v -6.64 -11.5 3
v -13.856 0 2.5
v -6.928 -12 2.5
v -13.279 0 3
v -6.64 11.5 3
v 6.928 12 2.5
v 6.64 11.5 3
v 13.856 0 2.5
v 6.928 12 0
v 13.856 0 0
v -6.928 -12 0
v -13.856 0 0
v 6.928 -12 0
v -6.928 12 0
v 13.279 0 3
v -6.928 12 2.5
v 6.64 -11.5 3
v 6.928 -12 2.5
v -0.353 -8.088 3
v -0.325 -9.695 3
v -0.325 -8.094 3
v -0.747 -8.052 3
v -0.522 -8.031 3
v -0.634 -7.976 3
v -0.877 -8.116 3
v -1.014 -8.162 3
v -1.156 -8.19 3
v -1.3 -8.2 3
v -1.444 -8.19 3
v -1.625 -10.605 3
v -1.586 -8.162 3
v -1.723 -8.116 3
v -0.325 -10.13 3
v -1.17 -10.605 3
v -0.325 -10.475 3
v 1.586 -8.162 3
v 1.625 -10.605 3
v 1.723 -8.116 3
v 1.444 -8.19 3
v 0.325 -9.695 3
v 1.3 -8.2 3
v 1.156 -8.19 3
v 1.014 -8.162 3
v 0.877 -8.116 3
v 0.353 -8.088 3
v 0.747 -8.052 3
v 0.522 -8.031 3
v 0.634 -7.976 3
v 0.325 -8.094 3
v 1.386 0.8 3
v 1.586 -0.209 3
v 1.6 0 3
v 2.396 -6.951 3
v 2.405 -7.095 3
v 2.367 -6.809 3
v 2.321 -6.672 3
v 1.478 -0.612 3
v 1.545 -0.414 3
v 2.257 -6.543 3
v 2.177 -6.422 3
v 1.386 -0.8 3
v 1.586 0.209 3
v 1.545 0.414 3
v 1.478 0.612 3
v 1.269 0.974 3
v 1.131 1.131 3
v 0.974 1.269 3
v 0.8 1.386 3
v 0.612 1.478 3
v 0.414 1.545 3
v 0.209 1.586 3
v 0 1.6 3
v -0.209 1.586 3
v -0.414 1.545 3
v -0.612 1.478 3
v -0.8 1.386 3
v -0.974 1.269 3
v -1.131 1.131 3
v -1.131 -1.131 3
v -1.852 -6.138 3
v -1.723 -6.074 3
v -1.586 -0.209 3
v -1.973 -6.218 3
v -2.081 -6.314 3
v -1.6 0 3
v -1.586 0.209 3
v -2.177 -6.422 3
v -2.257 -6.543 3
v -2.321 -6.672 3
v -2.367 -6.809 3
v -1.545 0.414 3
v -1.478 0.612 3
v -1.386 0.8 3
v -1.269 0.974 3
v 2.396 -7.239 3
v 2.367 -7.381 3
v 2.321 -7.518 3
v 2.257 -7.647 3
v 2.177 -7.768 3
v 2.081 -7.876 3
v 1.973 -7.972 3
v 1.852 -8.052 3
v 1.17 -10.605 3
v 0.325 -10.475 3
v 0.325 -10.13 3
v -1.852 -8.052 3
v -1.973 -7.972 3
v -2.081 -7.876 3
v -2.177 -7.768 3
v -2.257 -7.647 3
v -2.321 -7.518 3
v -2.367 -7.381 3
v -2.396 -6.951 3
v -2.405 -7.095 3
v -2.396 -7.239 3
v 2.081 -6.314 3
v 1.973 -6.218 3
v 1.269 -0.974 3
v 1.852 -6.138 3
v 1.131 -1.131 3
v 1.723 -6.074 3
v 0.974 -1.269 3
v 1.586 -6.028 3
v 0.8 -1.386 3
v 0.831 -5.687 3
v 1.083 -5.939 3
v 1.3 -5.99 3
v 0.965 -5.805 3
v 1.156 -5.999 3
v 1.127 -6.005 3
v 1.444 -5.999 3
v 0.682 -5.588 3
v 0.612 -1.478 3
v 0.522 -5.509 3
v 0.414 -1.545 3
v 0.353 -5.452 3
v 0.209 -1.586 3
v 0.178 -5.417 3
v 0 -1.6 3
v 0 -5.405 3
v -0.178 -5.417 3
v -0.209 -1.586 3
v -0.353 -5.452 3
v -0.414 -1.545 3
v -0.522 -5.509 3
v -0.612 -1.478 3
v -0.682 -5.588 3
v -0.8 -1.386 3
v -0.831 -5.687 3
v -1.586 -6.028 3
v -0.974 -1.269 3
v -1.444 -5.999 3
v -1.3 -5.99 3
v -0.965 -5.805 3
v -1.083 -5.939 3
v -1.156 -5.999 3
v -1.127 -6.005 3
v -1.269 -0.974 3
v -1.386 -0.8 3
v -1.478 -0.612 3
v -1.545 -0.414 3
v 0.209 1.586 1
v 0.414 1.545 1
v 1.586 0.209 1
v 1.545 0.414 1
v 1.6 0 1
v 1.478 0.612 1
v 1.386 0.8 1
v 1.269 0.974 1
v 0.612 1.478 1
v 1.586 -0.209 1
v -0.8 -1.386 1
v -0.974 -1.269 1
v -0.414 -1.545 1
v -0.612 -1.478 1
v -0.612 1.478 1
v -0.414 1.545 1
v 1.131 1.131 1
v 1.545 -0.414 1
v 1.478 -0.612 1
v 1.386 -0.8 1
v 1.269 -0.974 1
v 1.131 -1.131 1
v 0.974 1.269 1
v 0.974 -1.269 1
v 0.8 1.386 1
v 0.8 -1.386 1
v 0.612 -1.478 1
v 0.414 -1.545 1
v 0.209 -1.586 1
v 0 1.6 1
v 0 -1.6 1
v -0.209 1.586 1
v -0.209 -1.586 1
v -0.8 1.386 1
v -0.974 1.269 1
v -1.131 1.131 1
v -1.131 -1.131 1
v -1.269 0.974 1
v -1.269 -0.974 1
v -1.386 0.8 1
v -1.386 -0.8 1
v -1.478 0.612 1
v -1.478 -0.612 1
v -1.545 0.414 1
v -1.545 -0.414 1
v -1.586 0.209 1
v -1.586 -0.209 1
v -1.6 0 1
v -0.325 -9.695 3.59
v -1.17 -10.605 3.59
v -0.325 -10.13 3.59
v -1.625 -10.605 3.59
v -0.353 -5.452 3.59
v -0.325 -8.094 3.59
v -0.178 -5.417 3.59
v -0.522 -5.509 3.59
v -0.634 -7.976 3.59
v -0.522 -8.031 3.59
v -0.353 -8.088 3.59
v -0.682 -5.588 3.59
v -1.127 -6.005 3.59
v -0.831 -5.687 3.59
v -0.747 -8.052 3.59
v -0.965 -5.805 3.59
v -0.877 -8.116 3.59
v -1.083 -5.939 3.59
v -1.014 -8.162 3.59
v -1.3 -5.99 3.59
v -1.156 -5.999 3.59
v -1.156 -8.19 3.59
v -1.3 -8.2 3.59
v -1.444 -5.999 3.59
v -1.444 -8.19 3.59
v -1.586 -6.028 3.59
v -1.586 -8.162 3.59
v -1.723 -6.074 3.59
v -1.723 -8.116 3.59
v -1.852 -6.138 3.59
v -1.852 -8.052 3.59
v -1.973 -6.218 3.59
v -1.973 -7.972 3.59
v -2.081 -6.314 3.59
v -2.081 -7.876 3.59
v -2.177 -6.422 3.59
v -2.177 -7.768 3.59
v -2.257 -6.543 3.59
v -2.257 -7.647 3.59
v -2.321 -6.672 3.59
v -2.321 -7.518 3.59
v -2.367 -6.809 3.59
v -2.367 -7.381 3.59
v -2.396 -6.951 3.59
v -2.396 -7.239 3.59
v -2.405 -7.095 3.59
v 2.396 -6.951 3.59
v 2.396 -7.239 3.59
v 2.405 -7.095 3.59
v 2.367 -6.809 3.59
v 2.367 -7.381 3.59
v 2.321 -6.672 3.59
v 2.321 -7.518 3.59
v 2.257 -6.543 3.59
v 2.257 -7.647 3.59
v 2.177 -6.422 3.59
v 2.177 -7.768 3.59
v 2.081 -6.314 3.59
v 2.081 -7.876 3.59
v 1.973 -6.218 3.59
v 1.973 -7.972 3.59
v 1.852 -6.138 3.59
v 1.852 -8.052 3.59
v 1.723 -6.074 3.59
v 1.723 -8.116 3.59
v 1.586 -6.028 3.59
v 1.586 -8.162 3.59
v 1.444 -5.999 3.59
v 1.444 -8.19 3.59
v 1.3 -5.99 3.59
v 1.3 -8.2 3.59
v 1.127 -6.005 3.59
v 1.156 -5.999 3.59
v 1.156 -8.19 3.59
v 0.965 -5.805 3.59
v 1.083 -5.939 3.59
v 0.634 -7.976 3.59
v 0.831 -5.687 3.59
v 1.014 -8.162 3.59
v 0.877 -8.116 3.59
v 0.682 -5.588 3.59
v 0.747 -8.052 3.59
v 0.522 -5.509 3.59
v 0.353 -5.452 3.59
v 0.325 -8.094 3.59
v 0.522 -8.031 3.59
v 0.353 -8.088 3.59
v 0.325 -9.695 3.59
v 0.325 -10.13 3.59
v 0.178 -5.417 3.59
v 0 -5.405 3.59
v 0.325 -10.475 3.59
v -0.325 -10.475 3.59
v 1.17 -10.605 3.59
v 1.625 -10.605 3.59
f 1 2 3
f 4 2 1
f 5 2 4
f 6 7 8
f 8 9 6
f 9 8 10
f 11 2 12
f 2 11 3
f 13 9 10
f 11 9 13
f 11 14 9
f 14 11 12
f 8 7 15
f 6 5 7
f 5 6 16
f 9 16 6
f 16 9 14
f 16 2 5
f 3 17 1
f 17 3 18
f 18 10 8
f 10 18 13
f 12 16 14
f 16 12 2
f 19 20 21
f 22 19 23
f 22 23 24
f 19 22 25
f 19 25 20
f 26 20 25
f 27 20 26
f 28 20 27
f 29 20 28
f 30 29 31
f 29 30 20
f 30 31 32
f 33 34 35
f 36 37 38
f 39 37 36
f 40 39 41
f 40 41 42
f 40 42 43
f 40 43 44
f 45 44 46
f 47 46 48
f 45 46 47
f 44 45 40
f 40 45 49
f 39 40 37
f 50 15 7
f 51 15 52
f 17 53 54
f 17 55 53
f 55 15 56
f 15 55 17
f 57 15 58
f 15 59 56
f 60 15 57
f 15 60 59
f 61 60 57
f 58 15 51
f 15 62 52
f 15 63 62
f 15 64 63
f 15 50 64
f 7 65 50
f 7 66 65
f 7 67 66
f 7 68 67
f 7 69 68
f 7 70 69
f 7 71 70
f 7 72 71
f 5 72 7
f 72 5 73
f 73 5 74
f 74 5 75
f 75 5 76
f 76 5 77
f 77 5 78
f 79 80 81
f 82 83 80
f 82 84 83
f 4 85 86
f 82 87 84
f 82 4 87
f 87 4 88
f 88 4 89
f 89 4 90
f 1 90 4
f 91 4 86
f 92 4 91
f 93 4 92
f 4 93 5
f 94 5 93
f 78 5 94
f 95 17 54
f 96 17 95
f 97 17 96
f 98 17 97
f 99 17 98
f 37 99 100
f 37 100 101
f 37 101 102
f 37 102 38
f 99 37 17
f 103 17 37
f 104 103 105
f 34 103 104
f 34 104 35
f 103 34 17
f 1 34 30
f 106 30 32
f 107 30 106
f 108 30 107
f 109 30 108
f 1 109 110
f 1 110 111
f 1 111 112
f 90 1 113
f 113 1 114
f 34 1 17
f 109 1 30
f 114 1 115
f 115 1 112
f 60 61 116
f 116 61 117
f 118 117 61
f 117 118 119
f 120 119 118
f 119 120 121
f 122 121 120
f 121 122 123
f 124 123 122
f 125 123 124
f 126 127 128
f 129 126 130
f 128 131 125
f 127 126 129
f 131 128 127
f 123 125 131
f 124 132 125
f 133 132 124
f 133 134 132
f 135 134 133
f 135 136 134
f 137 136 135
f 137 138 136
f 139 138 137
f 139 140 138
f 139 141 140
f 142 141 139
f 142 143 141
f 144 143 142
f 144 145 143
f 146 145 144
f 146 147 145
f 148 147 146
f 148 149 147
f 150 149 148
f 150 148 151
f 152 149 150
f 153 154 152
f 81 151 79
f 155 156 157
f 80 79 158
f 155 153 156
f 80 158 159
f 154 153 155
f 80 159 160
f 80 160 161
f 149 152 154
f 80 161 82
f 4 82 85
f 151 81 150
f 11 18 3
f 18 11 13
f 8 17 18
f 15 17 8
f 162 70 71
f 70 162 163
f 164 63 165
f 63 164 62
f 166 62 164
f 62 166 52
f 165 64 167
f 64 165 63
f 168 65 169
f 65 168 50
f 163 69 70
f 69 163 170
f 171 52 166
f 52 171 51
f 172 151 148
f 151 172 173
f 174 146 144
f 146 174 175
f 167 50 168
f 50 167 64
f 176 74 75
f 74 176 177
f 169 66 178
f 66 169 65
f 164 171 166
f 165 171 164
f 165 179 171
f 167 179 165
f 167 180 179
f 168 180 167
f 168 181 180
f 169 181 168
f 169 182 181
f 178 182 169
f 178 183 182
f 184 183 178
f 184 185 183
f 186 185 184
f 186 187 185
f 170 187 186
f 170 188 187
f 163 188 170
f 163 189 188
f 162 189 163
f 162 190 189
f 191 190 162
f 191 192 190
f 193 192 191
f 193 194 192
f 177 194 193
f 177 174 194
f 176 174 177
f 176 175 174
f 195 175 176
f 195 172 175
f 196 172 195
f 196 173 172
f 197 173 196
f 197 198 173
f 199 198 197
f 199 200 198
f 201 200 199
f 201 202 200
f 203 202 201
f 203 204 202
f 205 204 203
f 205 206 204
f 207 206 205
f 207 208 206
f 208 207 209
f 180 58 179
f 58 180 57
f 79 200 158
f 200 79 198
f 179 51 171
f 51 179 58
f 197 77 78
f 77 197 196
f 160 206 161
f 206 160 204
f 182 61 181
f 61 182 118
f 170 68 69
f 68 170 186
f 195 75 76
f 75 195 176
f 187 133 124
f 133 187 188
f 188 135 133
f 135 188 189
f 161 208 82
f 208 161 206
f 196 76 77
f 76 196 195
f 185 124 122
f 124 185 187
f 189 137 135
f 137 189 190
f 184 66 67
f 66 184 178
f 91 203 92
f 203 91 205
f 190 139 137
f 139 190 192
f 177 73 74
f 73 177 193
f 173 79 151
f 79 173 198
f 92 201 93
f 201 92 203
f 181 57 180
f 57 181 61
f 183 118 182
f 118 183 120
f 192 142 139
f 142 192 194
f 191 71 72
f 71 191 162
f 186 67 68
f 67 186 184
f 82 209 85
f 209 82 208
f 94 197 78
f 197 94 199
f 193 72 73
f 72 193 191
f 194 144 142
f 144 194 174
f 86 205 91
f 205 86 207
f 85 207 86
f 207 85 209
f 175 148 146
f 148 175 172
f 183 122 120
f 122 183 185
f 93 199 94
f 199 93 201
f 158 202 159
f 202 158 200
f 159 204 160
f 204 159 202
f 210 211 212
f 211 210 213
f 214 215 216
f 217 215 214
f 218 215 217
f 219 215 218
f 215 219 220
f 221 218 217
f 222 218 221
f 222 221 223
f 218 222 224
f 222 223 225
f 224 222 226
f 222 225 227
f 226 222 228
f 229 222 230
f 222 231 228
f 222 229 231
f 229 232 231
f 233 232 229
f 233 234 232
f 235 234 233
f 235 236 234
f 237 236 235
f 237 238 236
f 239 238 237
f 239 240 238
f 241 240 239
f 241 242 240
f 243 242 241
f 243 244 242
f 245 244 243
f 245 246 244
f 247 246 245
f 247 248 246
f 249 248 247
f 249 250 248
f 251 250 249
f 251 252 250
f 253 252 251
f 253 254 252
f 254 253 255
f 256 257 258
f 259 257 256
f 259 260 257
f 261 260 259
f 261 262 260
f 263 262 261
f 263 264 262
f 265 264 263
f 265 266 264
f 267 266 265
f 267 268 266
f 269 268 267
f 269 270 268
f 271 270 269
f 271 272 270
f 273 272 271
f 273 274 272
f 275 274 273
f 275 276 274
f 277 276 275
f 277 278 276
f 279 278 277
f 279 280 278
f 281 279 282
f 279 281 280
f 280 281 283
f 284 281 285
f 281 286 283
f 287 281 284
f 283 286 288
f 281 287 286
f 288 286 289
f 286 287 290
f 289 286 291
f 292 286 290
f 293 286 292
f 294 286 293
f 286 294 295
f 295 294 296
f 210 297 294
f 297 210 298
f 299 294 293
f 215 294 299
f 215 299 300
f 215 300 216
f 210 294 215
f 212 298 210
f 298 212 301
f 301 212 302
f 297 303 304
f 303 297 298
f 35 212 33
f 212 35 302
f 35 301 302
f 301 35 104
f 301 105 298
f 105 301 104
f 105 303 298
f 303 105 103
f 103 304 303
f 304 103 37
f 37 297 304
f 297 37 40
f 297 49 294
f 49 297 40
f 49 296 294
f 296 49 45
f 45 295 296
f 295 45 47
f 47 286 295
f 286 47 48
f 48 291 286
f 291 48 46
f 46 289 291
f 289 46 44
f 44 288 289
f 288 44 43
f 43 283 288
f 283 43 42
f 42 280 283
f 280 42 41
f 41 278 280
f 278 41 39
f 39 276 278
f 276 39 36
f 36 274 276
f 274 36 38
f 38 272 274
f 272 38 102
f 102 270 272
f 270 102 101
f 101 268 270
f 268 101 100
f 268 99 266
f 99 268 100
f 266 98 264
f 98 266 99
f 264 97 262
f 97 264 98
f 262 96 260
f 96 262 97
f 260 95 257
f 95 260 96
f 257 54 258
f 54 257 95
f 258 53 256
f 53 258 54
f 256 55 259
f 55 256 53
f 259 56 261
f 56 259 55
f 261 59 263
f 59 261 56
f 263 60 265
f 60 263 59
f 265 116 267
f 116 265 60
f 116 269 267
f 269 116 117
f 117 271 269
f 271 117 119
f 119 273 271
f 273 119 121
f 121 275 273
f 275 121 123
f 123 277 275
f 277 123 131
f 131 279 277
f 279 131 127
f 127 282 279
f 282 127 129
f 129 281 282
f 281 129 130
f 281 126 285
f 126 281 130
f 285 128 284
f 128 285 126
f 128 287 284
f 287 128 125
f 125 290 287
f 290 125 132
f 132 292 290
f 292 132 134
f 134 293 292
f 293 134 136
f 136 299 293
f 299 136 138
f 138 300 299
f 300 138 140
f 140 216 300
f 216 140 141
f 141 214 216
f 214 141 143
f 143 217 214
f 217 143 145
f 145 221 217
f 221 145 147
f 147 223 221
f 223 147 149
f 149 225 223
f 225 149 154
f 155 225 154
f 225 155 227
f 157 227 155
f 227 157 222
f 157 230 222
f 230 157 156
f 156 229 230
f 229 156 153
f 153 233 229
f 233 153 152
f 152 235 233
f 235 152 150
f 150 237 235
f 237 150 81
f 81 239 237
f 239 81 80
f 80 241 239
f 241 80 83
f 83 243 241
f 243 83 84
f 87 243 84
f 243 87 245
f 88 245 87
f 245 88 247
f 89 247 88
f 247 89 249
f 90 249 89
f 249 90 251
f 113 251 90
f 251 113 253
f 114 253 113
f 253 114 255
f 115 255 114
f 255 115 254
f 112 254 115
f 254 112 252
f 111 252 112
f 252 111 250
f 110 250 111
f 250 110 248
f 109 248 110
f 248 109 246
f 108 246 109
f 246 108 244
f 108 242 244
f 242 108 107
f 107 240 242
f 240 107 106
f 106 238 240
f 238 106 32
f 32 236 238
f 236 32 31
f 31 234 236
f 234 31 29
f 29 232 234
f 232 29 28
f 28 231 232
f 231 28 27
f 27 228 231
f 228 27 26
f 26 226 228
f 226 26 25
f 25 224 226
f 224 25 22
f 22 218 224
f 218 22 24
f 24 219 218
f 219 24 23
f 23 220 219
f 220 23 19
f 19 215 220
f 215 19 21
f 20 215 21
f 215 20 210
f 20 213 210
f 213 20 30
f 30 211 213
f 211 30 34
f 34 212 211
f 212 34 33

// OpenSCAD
// Podstawka figurki — Strażnicy Kryształowego Drzewa (docs/FIGURKI_SPECYFIKACJA.md, rozdz. 2).
// Sześciokąt 24 mm między płaskimi bokami, ustawiony jak pola areny (płaski bok z przodu i z tyłu).
// Na górze, przy przedniej krawędzi, wypukły herb frakcji; na środku gniazdo na kołek figurki;
// na tylnej ściance (opcjonalnie) nazwa jednostki.
//
// Eksport: openscad -D 'frakcja="przymierze"' -D 'nazwa="Złoty Smok"' -o zloty_smok.stl podstawka.scad

frakcja = "przymierze";   // "przymierze" | "horda" | "straznik"
nazwa = "";               // napis na tylnej ściance; pusty = bez napisu

szerokosc = 24;           // mm między płaskimi bokami
wysokosc = 3;             // mm
fazka = 0.5;              // mm, fazka górnej krawędzi
herb_wypuklosc = 0.6;     // mm ponad górną powierzchnię
herb_rozmiar = 6.5;       // mm, szerokość herbu
kolek_srednica = 3.2;     // mm (kołek figurki Ø 3 mm + luz)
kolek_glebokosc = 2;      // mm
napis_wysokosc = 2.2;     // mm (ścianka ma 3 mm)

$fn = 48;

// Promień do wierzchołka sześciokąta o danym rozstawie płaskich boków.
function r_wierzcholek(f) = f / sqrt(3);

module szesciokat(f) {
  // Płaskie boki z przodu (−Y) i z tyłu (+Y), jak pola areny z płaskimi bokami u góry i u dołu.
  circle(r = r_wierzcholek(f), $fn = 6);
}

module bryla() {
  hull() {
    linear_extrude(wysokosc - fazka) szesciokat(szerokosc);
    translate([0, 0, wysokosc - fazka]) linear_extrude(fazka) szesciokat(szerokosc - 2 * fazka);
  }
}

// ---------------------------------------------------------------- herby (2D, w okręgu o średnicy 1)

module herb_drzewo() {
  // Korona z trzech kół, pień i dwa korzenie.
  translate([0, 0.12]) {
    circle(d = 0.42);
    translate([-0.2, -0.05]) circle(d = 0.34);
    translate([0.2, -0.05]) circle(d = 0.34);
  }
  translate([-0.05, -0.45]) square([0.1, 0.42]);
  polygon([[-0.05, -0.33], [-0.25, -0.47], [-0.18, -0.47], [-0.02, -0.38]]);
  polygon([[0.05, -0.33], [0.25, -0.47], [0.18, -0.47], [0.02, -0.38]]);
}

module herb_helm() {
  // Kopuła hełmu z osłoną nosa i dwa rogi wygięte do góry.
  difference() {
    union() {
      translate([0, -0.05]) circle(d = 0.5);
      translate([-0.25, -0.35]) square([0.5, 0.3]);
    }
    translate([-0.18, -0.36]) square([0.13, 0.14]);
    translate([0.05, -0.36]) square([0.13, 0.14]);
  }
  for (s = [-1, 1]) mirror([s < 0 ? 1 : 0, 0])
    hull() {
      translate([0.22, 0.02]) circle(d = 0.14);
      translate([0.42, 0.25]) circle(d = 0.06);
    }
}

module herb_krysztal() {
  // Kryształ: wydłużony sześciokąt z ostrymi końcami.
  polygon([[0, 0.48], [0.22, 0.2], [0.22, -0.2], [0, -0.48], [-0.22, -0.2], [-0.22, 0.2]]);
}

module herb() {
  scale([herb_rozmiar, herb_rozmiar])
    if (frakcja == "horda") herb_helm();
    else if (frakcja == "straznik") herb_krysztal();
    else herb_drzewo();
}

// ---------------------------------------------------------------- model

difference() {
  bryla();
  // Gniazdo na kołek figurki, na środku.
  translate([0, 0, wysokosc - kolek_glebokosc]) cylinder(d = kolek_srednica, h = kolek_glebokosc + 0.01);
  // Nazwa wycięta w tylnej ściance (0,4 mm).
  if (nazwa != "")
    translate([0, szerokosc / 2 - 0.4, (wysokosc - napis_wysokosc) / 2]) rotate([90, 0, 180])
      linear_extrude(1) text(nazwa, size = napis_wysokosc, halign = "center", font = "Liberation Sans:style=Bold");
}
// Herb przy przedniej krawędzi (−Y), wypukły.
translate([0, -szerokosc / 2 + herb_rozmiar / 2 + 1.2, wysokosc - 0.01]) linear_extrude(herb_wypuklosc) herb();
